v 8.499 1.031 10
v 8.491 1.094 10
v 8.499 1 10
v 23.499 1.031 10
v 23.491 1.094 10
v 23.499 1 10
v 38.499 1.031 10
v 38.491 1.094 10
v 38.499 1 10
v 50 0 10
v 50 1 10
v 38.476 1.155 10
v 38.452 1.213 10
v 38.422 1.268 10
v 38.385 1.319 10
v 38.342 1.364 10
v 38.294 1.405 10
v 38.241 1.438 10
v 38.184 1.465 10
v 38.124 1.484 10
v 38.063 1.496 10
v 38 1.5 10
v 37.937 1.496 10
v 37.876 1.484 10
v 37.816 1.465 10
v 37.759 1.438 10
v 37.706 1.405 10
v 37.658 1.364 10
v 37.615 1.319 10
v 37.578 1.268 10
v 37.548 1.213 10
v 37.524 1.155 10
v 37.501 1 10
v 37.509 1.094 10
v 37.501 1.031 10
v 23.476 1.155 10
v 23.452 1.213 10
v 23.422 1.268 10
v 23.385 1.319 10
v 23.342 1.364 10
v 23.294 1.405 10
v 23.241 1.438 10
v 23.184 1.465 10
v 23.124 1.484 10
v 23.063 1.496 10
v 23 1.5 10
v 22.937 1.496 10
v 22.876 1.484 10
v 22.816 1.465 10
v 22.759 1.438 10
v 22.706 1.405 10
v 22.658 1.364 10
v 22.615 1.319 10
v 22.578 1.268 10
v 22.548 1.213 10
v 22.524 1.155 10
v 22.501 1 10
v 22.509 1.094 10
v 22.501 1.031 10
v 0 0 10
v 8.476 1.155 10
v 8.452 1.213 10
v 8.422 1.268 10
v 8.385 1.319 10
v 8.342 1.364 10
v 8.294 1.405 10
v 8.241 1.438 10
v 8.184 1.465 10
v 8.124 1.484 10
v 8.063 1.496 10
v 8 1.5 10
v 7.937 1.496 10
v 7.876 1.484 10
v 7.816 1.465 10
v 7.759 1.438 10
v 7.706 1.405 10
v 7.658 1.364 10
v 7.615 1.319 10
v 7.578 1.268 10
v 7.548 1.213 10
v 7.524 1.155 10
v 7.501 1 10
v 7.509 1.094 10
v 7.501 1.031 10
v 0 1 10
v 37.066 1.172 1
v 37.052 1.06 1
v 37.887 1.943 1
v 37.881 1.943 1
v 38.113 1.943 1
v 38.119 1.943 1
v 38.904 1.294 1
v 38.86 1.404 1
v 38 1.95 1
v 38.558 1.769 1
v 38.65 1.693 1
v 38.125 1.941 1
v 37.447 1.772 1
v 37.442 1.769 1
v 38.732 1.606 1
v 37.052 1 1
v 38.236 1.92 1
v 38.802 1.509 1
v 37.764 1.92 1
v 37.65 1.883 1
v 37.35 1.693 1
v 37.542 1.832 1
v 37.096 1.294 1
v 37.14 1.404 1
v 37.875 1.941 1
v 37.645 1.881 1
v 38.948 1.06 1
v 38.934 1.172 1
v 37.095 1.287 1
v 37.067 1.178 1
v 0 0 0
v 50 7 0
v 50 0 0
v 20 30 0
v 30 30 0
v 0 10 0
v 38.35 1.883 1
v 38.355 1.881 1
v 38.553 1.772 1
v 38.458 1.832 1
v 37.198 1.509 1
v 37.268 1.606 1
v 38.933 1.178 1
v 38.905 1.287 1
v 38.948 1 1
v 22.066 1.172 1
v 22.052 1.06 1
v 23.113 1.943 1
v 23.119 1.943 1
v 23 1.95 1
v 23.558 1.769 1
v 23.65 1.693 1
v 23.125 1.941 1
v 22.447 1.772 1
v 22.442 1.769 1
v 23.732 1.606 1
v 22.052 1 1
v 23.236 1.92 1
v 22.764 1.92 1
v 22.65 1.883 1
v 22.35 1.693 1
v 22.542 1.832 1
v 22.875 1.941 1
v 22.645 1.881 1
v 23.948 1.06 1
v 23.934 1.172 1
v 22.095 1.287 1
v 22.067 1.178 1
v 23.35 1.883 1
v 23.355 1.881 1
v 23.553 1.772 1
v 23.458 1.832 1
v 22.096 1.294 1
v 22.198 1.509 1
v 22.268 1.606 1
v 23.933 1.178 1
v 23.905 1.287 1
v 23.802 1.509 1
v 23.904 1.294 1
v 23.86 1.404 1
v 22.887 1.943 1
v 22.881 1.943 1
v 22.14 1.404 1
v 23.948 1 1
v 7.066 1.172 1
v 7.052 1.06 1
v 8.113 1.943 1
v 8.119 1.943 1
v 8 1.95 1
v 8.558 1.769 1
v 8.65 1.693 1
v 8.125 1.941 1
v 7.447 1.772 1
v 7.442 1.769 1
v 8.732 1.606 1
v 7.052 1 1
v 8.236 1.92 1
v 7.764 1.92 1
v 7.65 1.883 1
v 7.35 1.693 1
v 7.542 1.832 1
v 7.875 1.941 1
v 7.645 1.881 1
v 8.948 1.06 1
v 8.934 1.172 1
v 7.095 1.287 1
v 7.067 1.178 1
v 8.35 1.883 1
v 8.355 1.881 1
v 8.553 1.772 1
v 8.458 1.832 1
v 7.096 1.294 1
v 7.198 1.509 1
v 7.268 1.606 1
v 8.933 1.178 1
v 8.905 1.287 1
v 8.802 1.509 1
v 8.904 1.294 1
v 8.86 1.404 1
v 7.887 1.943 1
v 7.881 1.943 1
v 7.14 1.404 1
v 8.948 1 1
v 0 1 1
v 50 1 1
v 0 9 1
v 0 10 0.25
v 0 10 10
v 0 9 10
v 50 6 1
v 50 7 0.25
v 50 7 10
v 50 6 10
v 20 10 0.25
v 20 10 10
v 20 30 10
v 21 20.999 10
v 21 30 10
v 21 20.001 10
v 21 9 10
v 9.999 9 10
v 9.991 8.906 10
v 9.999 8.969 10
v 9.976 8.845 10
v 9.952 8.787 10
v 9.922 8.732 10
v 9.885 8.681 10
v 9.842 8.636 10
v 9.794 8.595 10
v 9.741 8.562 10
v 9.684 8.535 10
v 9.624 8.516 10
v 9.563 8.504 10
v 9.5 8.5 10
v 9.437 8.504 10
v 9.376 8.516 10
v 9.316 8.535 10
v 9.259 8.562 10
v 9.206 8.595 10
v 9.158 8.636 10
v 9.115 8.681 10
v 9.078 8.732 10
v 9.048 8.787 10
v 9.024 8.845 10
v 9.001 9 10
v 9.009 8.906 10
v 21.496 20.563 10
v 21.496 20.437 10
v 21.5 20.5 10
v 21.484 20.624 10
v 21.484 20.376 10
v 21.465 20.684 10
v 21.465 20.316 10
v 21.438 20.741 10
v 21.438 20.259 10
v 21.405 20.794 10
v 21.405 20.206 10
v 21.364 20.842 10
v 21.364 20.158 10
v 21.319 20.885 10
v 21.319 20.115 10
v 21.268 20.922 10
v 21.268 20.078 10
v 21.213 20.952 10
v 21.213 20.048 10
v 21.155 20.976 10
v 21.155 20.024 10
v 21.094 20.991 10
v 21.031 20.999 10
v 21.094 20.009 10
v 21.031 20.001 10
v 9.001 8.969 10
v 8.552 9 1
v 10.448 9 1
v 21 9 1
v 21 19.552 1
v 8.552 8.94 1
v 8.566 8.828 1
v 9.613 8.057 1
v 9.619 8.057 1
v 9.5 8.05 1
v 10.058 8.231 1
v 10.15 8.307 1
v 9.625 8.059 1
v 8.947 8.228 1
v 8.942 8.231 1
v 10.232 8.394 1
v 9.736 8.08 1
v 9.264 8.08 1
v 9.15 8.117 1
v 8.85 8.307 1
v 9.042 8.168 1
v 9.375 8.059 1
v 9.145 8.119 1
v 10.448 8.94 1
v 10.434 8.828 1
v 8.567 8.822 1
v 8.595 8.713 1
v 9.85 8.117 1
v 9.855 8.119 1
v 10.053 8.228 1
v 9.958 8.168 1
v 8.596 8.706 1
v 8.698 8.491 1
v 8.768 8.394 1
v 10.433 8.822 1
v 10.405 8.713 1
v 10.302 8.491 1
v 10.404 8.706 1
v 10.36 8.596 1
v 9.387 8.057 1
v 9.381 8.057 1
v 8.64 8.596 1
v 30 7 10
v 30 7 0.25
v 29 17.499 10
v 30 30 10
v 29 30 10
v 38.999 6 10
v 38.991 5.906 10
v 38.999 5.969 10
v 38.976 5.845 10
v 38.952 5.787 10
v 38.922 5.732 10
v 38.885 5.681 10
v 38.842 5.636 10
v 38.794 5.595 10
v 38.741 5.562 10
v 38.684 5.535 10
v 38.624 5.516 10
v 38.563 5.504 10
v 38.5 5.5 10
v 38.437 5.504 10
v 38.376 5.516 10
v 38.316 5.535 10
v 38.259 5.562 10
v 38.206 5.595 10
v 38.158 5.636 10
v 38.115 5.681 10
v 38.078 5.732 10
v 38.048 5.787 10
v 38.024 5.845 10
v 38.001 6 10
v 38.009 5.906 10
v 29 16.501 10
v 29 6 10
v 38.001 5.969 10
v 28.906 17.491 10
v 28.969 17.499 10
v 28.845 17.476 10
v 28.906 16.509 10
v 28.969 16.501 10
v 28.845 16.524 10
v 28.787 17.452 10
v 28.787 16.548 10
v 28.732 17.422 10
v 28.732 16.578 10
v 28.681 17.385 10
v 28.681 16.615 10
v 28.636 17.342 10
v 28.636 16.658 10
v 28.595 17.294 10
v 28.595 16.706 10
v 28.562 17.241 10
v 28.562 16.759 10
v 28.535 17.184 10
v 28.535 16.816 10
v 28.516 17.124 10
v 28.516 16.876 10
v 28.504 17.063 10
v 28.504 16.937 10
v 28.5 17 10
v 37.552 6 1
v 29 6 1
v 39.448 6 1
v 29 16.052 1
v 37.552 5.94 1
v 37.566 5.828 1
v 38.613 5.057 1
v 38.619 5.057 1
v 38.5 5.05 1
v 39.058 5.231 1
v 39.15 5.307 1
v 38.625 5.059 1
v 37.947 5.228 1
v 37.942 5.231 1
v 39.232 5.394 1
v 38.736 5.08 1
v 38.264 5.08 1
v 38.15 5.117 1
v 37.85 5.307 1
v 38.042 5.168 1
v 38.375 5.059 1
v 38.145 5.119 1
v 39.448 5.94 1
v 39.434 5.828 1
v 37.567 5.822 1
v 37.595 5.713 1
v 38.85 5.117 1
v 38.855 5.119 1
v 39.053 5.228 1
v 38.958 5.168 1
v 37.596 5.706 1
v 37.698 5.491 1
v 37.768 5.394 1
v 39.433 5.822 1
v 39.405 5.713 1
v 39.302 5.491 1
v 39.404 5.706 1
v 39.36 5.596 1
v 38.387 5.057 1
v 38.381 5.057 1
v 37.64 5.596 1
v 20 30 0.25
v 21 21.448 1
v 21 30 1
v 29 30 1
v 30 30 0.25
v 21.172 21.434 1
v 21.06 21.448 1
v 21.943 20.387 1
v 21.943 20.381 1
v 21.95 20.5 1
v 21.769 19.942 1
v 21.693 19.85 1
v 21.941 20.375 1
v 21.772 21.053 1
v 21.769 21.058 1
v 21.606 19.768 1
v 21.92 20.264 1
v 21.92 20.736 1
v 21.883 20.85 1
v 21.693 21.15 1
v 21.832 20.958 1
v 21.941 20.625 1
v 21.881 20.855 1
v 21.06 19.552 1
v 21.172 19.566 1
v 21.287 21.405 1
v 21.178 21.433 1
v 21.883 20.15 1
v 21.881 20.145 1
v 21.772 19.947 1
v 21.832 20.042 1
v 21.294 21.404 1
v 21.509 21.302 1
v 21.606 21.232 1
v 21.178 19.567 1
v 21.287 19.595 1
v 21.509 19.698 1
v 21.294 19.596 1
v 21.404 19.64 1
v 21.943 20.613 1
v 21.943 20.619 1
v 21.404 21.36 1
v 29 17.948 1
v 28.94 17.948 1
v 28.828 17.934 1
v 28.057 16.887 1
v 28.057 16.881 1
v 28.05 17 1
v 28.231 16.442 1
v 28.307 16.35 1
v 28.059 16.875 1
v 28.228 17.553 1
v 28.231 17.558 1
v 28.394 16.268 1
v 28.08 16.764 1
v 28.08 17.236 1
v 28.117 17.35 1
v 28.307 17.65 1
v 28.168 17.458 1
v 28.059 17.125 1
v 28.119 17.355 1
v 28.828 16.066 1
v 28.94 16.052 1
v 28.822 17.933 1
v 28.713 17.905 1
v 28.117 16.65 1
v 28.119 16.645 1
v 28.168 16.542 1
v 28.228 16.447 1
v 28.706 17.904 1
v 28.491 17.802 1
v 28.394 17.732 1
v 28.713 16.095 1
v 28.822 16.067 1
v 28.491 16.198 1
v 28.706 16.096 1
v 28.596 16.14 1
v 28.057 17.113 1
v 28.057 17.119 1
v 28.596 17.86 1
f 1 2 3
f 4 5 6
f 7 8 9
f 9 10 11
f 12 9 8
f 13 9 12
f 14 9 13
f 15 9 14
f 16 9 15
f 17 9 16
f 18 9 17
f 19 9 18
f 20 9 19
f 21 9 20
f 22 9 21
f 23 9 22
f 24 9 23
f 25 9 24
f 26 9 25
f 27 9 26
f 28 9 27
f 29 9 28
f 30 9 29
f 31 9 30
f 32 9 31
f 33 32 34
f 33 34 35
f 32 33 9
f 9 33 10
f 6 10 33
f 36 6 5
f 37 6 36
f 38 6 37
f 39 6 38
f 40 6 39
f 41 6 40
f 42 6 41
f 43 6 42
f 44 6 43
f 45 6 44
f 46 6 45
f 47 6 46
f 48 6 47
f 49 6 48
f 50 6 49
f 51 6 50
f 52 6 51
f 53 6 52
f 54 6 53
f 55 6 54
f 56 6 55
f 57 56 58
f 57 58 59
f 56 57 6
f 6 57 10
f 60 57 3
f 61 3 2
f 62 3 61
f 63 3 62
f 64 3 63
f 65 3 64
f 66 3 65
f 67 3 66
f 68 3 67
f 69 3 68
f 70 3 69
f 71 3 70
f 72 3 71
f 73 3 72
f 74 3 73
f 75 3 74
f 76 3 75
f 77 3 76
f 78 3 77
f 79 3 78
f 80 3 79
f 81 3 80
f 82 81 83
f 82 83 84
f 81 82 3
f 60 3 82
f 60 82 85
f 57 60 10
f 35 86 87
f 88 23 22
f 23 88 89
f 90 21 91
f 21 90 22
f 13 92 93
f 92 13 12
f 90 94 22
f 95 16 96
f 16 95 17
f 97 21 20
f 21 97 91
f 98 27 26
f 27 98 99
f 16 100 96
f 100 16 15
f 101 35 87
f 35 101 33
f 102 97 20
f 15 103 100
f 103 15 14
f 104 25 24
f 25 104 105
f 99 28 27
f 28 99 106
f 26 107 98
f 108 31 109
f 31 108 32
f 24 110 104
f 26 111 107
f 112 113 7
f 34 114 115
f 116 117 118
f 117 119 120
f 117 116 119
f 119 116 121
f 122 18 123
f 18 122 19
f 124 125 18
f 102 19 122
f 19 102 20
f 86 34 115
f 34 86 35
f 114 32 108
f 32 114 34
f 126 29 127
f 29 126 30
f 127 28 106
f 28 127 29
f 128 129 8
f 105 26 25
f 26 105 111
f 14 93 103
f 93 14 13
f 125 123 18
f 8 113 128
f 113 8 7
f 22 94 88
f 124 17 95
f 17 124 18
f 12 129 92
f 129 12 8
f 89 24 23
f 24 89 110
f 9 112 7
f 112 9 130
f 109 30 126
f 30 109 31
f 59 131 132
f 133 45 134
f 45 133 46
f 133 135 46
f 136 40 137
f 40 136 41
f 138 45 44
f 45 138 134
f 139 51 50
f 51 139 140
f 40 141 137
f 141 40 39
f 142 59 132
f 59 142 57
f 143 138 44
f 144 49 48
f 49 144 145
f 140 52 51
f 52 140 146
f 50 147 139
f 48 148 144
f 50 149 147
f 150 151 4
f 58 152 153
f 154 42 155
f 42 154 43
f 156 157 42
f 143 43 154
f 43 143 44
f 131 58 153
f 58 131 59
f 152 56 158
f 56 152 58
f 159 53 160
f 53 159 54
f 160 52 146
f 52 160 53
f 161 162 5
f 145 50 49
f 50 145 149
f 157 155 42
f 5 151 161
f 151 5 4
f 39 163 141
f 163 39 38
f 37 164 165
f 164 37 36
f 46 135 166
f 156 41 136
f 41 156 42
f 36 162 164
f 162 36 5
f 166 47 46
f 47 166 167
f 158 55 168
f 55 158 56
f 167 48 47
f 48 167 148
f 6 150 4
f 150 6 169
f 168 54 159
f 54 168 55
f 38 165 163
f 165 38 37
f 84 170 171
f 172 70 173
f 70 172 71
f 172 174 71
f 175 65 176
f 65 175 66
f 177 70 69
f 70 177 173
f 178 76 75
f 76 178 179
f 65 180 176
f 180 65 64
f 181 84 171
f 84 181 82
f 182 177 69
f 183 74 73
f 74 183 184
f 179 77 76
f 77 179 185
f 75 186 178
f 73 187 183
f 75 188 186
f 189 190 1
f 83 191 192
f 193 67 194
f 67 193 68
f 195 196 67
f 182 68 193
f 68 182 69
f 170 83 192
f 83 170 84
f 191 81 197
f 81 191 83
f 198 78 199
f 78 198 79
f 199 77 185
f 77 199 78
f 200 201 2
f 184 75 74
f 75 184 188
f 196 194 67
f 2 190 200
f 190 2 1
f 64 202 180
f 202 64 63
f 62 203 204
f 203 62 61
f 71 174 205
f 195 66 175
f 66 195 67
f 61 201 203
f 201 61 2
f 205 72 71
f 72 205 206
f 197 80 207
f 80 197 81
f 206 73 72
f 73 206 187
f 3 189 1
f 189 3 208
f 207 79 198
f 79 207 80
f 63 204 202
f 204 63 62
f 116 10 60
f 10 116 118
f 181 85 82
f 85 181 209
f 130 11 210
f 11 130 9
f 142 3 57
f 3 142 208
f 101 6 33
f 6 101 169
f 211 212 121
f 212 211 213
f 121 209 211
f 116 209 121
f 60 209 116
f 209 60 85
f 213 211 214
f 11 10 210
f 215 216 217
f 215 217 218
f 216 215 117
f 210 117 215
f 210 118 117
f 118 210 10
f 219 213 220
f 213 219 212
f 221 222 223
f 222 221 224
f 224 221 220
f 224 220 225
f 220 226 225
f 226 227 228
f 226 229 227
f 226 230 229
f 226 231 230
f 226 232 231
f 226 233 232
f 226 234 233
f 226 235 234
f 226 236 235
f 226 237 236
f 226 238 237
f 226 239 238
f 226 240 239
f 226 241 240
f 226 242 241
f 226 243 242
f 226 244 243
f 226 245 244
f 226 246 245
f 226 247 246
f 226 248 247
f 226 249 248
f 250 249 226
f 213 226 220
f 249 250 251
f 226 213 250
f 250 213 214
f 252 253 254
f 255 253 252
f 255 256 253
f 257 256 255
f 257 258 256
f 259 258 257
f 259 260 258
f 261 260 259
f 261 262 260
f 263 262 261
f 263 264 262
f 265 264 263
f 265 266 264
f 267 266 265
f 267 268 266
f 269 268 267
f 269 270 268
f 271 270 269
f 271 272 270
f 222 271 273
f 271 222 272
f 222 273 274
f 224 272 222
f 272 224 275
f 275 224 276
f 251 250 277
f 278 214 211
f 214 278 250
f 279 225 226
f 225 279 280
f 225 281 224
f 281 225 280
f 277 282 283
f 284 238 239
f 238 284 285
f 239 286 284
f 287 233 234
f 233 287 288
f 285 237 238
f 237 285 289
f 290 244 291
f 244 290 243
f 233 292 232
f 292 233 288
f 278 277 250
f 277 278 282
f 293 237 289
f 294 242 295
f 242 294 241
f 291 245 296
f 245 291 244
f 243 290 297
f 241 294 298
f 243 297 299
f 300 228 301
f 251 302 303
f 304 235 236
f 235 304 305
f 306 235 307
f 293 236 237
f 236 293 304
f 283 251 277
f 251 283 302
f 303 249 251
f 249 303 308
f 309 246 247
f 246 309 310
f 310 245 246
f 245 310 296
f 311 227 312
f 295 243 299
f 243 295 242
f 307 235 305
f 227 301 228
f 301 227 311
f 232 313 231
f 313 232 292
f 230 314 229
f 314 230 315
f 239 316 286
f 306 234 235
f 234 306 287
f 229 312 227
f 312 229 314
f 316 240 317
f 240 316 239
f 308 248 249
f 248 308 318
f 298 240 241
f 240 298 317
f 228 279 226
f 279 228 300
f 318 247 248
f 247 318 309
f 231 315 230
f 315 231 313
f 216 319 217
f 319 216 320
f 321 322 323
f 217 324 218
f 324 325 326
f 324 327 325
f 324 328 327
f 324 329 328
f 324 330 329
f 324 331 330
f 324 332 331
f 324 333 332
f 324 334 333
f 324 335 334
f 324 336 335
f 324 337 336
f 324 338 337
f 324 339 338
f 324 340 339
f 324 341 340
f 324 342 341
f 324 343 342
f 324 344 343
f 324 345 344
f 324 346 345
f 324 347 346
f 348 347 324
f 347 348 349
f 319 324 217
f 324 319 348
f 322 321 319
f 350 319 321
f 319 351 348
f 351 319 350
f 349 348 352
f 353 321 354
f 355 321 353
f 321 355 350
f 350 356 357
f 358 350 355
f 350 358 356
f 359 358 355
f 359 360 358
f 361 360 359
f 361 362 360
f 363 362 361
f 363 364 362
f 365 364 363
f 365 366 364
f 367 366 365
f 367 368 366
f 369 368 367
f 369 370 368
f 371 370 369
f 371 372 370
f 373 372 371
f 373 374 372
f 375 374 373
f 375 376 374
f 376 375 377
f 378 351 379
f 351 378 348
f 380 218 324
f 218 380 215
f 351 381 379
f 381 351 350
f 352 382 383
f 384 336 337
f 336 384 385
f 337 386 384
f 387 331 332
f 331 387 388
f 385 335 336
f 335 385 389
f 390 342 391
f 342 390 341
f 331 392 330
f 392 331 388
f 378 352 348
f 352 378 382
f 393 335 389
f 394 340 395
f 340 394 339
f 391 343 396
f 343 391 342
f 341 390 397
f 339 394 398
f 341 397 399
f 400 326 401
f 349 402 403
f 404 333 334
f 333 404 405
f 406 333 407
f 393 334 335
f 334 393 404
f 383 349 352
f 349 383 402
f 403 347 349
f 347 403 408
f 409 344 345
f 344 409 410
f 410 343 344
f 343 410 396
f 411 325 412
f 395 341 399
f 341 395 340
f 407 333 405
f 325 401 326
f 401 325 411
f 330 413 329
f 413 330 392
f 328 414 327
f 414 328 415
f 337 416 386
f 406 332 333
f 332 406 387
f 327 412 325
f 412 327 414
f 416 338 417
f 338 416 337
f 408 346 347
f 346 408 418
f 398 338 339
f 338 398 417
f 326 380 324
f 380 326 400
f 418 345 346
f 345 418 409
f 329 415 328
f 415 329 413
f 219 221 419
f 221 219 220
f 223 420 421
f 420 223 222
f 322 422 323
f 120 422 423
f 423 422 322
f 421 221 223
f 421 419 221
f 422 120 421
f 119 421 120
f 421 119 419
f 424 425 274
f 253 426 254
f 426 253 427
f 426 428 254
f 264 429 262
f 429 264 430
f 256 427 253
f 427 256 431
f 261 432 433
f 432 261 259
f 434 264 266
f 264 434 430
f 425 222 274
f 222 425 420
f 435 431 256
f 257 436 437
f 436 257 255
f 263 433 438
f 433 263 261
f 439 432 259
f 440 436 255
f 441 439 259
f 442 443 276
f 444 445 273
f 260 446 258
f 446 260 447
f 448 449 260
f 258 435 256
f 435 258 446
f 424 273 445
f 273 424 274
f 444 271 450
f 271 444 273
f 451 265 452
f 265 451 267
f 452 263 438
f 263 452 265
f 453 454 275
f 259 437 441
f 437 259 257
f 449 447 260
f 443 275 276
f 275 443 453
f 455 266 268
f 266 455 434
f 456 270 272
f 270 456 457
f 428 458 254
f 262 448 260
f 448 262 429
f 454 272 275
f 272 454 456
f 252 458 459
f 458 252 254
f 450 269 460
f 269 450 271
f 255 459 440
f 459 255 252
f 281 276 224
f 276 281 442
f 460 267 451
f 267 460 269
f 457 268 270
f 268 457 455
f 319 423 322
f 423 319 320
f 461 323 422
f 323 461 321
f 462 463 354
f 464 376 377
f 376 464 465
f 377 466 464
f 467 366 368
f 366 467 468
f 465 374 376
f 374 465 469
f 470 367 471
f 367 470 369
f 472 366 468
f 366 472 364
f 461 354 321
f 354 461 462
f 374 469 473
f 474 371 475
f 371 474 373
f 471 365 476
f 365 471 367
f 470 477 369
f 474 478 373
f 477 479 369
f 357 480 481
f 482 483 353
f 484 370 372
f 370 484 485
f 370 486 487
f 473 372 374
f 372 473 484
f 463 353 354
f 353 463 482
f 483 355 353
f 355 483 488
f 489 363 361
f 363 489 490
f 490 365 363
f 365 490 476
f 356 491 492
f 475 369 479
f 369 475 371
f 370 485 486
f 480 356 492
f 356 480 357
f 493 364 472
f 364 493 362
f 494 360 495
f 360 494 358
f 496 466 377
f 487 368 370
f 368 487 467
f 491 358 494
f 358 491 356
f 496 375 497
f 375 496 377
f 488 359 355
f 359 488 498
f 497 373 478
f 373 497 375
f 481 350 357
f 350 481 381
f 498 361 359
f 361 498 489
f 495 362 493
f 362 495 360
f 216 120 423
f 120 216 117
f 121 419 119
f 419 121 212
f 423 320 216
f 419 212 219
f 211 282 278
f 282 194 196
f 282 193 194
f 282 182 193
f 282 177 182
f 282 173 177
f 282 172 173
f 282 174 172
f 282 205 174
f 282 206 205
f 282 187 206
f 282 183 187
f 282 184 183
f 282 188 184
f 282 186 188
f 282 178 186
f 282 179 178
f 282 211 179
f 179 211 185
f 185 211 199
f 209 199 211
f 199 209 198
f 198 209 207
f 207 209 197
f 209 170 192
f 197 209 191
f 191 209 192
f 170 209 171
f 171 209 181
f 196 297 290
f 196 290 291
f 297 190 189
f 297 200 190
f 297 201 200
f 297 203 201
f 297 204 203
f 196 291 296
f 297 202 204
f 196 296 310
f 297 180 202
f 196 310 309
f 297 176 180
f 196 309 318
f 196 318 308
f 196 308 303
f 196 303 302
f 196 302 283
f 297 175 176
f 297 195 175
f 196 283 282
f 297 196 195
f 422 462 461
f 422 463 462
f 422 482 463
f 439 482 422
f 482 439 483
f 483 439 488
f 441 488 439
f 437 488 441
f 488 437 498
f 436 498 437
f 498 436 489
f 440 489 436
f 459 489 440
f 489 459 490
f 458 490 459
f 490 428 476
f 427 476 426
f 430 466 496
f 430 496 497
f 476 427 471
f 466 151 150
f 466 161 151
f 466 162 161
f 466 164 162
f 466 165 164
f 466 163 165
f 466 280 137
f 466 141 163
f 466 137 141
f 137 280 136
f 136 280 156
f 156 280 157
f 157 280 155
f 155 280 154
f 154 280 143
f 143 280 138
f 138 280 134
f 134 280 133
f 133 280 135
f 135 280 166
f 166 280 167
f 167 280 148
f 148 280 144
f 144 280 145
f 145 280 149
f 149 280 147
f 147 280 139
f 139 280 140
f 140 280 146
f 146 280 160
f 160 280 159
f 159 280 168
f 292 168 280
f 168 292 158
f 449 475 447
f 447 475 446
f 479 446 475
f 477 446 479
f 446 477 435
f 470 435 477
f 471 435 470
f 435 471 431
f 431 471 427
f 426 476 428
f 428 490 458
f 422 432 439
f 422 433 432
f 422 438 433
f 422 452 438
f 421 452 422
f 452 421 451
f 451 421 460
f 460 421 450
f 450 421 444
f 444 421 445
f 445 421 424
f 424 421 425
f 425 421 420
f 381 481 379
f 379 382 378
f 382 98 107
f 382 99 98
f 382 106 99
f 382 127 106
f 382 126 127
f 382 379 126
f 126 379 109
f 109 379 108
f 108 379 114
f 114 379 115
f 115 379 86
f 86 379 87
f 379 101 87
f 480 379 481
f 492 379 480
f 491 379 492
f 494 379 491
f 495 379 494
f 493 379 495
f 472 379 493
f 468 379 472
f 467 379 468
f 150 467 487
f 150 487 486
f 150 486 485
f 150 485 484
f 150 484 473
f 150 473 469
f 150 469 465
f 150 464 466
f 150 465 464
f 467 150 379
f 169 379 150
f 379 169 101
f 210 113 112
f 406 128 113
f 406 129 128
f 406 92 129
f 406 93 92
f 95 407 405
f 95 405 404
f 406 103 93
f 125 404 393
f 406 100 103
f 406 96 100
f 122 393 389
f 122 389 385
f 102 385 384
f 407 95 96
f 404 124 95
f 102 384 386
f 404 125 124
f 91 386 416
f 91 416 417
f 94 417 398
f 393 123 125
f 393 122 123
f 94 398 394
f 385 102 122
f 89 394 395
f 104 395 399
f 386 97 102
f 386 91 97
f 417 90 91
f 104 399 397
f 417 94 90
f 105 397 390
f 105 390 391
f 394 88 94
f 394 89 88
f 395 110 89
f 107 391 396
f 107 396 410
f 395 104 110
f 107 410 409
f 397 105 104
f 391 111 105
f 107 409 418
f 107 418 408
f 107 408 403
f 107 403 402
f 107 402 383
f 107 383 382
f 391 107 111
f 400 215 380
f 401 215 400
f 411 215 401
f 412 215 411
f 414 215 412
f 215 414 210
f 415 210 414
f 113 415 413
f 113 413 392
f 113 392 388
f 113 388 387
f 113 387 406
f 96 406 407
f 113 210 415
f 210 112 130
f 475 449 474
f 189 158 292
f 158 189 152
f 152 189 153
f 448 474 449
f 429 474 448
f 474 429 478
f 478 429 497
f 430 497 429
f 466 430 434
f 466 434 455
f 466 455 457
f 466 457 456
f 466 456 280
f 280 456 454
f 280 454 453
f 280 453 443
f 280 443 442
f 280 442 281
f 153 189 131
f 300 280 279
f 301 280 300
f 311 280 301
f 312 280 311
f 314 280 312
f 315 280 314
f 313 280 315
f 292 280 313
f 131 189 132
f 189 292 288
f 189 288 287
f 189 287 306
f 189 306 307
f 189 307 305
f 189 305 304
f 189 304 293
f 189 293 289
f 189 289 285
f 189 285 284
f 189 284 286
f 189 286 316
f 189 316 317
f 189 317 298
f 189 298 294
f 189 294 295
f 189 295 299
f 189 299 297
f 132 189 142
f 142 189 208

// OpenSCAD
$fn=50;

largeWidth = 8;
thinWidth = 5;

shell = 1;
baseShell = 1;
depth = 10;

largeBaseWidth = largeWidth + 2 * shell;
thinBaseWidth = thinWidth + 2 * shell;

legLength = 20;
totalLenght = 2* legLength + largeBaseWidth;

//wall(20);
//rib();

module myOwnKindOfBrim() {
polygon (
        [
            [0,0],
            [totalLenght,0],
            [totalLenght,thinBaseWidth],
//            [legLength + largeBaseWidth ,thinBaseWidth],
            [legLength + largeBaseWidth,legLength + largeBaseWidth],
            [legLength,legLength + largeBaseWidth],
//            [legLength,largeBaseWidth],
            [0,largeBaseWidth]
        ]
    );
}

// rightHandClip();
leftHandClip();

module rightHandClip() {
    mirror([1,0,0]) leftHandClip() ;
}



module rib() {
    
    translate ([-shell, 0,0 ]) cylinder(depth,shell , shell * .5);
    
}

module rib2()
{
    rotate([90,0,0])
    linear_extrude(shell)
        polygon(
        [
            [0,0],
            [- shell * 2,0],
            [- shell * 2,shell],
            [- shell ,depth],
            [0,depth]
        ]
        ) ;
}

module leftHandClip() {
    linear_extrude(.25)
   myOwnKindOfBrim();
    
    // base
    linear_extrude(baseShell)
    polygon (
        [
            [0,0],
            [totalLenght,0],
            [totalLenght,thinBaseWidth],
            [legLength + largeBaseWidth ,thinBaseWidth],
            [legLength + largeBaseWidth,legLength + largeBaseWidth],
            [legLength,legLength + largeBaseWidth],
            [legLength,largeBaseWidth],
            [0,largeBaseWidth]
        ]
    );
    
    translate([totalLenght, shell,0]) mirror([0,1,0]) rotate([0,0,90]) wall(totalLenght);
    translate([legLength + shell, largeBaseWidth - shell,0]) rotate([0,0,90]) legWall();
    translate([2* legLength + largeBaseWidth, thinBaseWidth - shell,0]) rotate([0,0,90]) legWall();
    translate([legLength + shell, largeBaseWidth - shell, 0]) mirror([1,0,0]) legWall();
    translate([legLength+ largeBaseWidth - shell, thinBaseWidth - shell, 0]) wall(largeBaseWidth - thinBaseWidth + legLength + shell);   

}

module legWall() {
    wall(legLength + shell);
}

module base(width) {
    union() { 
        cube([width, legLength + shell, shell]);
        //translate([0, shell,0]) wall(legLength);
        //translate([width - shell, shell,0]) wall(legLength);
    }
}


module wall(length) {
    
    union() { 
        cube([shell, length, depth]);
        
        
        gap = 15;
        
        steps = floor(length / gap);
        remain =  length - (gap * steps);
        offset = floor(remain / 2);
  //      echo(gap);
   //     echo(steps);
    //    echo(remain);
     //   echo(offset);
        for (a =[1:steps ]) {
            translate([shell, (a * gap) - offset / 2  -2 ,0])  rib();
        }
    }
    
}

module largeBase() {
    base(largeBaseWidth);
}


module thinBase() {
    base(thinBaseWidth);
}
